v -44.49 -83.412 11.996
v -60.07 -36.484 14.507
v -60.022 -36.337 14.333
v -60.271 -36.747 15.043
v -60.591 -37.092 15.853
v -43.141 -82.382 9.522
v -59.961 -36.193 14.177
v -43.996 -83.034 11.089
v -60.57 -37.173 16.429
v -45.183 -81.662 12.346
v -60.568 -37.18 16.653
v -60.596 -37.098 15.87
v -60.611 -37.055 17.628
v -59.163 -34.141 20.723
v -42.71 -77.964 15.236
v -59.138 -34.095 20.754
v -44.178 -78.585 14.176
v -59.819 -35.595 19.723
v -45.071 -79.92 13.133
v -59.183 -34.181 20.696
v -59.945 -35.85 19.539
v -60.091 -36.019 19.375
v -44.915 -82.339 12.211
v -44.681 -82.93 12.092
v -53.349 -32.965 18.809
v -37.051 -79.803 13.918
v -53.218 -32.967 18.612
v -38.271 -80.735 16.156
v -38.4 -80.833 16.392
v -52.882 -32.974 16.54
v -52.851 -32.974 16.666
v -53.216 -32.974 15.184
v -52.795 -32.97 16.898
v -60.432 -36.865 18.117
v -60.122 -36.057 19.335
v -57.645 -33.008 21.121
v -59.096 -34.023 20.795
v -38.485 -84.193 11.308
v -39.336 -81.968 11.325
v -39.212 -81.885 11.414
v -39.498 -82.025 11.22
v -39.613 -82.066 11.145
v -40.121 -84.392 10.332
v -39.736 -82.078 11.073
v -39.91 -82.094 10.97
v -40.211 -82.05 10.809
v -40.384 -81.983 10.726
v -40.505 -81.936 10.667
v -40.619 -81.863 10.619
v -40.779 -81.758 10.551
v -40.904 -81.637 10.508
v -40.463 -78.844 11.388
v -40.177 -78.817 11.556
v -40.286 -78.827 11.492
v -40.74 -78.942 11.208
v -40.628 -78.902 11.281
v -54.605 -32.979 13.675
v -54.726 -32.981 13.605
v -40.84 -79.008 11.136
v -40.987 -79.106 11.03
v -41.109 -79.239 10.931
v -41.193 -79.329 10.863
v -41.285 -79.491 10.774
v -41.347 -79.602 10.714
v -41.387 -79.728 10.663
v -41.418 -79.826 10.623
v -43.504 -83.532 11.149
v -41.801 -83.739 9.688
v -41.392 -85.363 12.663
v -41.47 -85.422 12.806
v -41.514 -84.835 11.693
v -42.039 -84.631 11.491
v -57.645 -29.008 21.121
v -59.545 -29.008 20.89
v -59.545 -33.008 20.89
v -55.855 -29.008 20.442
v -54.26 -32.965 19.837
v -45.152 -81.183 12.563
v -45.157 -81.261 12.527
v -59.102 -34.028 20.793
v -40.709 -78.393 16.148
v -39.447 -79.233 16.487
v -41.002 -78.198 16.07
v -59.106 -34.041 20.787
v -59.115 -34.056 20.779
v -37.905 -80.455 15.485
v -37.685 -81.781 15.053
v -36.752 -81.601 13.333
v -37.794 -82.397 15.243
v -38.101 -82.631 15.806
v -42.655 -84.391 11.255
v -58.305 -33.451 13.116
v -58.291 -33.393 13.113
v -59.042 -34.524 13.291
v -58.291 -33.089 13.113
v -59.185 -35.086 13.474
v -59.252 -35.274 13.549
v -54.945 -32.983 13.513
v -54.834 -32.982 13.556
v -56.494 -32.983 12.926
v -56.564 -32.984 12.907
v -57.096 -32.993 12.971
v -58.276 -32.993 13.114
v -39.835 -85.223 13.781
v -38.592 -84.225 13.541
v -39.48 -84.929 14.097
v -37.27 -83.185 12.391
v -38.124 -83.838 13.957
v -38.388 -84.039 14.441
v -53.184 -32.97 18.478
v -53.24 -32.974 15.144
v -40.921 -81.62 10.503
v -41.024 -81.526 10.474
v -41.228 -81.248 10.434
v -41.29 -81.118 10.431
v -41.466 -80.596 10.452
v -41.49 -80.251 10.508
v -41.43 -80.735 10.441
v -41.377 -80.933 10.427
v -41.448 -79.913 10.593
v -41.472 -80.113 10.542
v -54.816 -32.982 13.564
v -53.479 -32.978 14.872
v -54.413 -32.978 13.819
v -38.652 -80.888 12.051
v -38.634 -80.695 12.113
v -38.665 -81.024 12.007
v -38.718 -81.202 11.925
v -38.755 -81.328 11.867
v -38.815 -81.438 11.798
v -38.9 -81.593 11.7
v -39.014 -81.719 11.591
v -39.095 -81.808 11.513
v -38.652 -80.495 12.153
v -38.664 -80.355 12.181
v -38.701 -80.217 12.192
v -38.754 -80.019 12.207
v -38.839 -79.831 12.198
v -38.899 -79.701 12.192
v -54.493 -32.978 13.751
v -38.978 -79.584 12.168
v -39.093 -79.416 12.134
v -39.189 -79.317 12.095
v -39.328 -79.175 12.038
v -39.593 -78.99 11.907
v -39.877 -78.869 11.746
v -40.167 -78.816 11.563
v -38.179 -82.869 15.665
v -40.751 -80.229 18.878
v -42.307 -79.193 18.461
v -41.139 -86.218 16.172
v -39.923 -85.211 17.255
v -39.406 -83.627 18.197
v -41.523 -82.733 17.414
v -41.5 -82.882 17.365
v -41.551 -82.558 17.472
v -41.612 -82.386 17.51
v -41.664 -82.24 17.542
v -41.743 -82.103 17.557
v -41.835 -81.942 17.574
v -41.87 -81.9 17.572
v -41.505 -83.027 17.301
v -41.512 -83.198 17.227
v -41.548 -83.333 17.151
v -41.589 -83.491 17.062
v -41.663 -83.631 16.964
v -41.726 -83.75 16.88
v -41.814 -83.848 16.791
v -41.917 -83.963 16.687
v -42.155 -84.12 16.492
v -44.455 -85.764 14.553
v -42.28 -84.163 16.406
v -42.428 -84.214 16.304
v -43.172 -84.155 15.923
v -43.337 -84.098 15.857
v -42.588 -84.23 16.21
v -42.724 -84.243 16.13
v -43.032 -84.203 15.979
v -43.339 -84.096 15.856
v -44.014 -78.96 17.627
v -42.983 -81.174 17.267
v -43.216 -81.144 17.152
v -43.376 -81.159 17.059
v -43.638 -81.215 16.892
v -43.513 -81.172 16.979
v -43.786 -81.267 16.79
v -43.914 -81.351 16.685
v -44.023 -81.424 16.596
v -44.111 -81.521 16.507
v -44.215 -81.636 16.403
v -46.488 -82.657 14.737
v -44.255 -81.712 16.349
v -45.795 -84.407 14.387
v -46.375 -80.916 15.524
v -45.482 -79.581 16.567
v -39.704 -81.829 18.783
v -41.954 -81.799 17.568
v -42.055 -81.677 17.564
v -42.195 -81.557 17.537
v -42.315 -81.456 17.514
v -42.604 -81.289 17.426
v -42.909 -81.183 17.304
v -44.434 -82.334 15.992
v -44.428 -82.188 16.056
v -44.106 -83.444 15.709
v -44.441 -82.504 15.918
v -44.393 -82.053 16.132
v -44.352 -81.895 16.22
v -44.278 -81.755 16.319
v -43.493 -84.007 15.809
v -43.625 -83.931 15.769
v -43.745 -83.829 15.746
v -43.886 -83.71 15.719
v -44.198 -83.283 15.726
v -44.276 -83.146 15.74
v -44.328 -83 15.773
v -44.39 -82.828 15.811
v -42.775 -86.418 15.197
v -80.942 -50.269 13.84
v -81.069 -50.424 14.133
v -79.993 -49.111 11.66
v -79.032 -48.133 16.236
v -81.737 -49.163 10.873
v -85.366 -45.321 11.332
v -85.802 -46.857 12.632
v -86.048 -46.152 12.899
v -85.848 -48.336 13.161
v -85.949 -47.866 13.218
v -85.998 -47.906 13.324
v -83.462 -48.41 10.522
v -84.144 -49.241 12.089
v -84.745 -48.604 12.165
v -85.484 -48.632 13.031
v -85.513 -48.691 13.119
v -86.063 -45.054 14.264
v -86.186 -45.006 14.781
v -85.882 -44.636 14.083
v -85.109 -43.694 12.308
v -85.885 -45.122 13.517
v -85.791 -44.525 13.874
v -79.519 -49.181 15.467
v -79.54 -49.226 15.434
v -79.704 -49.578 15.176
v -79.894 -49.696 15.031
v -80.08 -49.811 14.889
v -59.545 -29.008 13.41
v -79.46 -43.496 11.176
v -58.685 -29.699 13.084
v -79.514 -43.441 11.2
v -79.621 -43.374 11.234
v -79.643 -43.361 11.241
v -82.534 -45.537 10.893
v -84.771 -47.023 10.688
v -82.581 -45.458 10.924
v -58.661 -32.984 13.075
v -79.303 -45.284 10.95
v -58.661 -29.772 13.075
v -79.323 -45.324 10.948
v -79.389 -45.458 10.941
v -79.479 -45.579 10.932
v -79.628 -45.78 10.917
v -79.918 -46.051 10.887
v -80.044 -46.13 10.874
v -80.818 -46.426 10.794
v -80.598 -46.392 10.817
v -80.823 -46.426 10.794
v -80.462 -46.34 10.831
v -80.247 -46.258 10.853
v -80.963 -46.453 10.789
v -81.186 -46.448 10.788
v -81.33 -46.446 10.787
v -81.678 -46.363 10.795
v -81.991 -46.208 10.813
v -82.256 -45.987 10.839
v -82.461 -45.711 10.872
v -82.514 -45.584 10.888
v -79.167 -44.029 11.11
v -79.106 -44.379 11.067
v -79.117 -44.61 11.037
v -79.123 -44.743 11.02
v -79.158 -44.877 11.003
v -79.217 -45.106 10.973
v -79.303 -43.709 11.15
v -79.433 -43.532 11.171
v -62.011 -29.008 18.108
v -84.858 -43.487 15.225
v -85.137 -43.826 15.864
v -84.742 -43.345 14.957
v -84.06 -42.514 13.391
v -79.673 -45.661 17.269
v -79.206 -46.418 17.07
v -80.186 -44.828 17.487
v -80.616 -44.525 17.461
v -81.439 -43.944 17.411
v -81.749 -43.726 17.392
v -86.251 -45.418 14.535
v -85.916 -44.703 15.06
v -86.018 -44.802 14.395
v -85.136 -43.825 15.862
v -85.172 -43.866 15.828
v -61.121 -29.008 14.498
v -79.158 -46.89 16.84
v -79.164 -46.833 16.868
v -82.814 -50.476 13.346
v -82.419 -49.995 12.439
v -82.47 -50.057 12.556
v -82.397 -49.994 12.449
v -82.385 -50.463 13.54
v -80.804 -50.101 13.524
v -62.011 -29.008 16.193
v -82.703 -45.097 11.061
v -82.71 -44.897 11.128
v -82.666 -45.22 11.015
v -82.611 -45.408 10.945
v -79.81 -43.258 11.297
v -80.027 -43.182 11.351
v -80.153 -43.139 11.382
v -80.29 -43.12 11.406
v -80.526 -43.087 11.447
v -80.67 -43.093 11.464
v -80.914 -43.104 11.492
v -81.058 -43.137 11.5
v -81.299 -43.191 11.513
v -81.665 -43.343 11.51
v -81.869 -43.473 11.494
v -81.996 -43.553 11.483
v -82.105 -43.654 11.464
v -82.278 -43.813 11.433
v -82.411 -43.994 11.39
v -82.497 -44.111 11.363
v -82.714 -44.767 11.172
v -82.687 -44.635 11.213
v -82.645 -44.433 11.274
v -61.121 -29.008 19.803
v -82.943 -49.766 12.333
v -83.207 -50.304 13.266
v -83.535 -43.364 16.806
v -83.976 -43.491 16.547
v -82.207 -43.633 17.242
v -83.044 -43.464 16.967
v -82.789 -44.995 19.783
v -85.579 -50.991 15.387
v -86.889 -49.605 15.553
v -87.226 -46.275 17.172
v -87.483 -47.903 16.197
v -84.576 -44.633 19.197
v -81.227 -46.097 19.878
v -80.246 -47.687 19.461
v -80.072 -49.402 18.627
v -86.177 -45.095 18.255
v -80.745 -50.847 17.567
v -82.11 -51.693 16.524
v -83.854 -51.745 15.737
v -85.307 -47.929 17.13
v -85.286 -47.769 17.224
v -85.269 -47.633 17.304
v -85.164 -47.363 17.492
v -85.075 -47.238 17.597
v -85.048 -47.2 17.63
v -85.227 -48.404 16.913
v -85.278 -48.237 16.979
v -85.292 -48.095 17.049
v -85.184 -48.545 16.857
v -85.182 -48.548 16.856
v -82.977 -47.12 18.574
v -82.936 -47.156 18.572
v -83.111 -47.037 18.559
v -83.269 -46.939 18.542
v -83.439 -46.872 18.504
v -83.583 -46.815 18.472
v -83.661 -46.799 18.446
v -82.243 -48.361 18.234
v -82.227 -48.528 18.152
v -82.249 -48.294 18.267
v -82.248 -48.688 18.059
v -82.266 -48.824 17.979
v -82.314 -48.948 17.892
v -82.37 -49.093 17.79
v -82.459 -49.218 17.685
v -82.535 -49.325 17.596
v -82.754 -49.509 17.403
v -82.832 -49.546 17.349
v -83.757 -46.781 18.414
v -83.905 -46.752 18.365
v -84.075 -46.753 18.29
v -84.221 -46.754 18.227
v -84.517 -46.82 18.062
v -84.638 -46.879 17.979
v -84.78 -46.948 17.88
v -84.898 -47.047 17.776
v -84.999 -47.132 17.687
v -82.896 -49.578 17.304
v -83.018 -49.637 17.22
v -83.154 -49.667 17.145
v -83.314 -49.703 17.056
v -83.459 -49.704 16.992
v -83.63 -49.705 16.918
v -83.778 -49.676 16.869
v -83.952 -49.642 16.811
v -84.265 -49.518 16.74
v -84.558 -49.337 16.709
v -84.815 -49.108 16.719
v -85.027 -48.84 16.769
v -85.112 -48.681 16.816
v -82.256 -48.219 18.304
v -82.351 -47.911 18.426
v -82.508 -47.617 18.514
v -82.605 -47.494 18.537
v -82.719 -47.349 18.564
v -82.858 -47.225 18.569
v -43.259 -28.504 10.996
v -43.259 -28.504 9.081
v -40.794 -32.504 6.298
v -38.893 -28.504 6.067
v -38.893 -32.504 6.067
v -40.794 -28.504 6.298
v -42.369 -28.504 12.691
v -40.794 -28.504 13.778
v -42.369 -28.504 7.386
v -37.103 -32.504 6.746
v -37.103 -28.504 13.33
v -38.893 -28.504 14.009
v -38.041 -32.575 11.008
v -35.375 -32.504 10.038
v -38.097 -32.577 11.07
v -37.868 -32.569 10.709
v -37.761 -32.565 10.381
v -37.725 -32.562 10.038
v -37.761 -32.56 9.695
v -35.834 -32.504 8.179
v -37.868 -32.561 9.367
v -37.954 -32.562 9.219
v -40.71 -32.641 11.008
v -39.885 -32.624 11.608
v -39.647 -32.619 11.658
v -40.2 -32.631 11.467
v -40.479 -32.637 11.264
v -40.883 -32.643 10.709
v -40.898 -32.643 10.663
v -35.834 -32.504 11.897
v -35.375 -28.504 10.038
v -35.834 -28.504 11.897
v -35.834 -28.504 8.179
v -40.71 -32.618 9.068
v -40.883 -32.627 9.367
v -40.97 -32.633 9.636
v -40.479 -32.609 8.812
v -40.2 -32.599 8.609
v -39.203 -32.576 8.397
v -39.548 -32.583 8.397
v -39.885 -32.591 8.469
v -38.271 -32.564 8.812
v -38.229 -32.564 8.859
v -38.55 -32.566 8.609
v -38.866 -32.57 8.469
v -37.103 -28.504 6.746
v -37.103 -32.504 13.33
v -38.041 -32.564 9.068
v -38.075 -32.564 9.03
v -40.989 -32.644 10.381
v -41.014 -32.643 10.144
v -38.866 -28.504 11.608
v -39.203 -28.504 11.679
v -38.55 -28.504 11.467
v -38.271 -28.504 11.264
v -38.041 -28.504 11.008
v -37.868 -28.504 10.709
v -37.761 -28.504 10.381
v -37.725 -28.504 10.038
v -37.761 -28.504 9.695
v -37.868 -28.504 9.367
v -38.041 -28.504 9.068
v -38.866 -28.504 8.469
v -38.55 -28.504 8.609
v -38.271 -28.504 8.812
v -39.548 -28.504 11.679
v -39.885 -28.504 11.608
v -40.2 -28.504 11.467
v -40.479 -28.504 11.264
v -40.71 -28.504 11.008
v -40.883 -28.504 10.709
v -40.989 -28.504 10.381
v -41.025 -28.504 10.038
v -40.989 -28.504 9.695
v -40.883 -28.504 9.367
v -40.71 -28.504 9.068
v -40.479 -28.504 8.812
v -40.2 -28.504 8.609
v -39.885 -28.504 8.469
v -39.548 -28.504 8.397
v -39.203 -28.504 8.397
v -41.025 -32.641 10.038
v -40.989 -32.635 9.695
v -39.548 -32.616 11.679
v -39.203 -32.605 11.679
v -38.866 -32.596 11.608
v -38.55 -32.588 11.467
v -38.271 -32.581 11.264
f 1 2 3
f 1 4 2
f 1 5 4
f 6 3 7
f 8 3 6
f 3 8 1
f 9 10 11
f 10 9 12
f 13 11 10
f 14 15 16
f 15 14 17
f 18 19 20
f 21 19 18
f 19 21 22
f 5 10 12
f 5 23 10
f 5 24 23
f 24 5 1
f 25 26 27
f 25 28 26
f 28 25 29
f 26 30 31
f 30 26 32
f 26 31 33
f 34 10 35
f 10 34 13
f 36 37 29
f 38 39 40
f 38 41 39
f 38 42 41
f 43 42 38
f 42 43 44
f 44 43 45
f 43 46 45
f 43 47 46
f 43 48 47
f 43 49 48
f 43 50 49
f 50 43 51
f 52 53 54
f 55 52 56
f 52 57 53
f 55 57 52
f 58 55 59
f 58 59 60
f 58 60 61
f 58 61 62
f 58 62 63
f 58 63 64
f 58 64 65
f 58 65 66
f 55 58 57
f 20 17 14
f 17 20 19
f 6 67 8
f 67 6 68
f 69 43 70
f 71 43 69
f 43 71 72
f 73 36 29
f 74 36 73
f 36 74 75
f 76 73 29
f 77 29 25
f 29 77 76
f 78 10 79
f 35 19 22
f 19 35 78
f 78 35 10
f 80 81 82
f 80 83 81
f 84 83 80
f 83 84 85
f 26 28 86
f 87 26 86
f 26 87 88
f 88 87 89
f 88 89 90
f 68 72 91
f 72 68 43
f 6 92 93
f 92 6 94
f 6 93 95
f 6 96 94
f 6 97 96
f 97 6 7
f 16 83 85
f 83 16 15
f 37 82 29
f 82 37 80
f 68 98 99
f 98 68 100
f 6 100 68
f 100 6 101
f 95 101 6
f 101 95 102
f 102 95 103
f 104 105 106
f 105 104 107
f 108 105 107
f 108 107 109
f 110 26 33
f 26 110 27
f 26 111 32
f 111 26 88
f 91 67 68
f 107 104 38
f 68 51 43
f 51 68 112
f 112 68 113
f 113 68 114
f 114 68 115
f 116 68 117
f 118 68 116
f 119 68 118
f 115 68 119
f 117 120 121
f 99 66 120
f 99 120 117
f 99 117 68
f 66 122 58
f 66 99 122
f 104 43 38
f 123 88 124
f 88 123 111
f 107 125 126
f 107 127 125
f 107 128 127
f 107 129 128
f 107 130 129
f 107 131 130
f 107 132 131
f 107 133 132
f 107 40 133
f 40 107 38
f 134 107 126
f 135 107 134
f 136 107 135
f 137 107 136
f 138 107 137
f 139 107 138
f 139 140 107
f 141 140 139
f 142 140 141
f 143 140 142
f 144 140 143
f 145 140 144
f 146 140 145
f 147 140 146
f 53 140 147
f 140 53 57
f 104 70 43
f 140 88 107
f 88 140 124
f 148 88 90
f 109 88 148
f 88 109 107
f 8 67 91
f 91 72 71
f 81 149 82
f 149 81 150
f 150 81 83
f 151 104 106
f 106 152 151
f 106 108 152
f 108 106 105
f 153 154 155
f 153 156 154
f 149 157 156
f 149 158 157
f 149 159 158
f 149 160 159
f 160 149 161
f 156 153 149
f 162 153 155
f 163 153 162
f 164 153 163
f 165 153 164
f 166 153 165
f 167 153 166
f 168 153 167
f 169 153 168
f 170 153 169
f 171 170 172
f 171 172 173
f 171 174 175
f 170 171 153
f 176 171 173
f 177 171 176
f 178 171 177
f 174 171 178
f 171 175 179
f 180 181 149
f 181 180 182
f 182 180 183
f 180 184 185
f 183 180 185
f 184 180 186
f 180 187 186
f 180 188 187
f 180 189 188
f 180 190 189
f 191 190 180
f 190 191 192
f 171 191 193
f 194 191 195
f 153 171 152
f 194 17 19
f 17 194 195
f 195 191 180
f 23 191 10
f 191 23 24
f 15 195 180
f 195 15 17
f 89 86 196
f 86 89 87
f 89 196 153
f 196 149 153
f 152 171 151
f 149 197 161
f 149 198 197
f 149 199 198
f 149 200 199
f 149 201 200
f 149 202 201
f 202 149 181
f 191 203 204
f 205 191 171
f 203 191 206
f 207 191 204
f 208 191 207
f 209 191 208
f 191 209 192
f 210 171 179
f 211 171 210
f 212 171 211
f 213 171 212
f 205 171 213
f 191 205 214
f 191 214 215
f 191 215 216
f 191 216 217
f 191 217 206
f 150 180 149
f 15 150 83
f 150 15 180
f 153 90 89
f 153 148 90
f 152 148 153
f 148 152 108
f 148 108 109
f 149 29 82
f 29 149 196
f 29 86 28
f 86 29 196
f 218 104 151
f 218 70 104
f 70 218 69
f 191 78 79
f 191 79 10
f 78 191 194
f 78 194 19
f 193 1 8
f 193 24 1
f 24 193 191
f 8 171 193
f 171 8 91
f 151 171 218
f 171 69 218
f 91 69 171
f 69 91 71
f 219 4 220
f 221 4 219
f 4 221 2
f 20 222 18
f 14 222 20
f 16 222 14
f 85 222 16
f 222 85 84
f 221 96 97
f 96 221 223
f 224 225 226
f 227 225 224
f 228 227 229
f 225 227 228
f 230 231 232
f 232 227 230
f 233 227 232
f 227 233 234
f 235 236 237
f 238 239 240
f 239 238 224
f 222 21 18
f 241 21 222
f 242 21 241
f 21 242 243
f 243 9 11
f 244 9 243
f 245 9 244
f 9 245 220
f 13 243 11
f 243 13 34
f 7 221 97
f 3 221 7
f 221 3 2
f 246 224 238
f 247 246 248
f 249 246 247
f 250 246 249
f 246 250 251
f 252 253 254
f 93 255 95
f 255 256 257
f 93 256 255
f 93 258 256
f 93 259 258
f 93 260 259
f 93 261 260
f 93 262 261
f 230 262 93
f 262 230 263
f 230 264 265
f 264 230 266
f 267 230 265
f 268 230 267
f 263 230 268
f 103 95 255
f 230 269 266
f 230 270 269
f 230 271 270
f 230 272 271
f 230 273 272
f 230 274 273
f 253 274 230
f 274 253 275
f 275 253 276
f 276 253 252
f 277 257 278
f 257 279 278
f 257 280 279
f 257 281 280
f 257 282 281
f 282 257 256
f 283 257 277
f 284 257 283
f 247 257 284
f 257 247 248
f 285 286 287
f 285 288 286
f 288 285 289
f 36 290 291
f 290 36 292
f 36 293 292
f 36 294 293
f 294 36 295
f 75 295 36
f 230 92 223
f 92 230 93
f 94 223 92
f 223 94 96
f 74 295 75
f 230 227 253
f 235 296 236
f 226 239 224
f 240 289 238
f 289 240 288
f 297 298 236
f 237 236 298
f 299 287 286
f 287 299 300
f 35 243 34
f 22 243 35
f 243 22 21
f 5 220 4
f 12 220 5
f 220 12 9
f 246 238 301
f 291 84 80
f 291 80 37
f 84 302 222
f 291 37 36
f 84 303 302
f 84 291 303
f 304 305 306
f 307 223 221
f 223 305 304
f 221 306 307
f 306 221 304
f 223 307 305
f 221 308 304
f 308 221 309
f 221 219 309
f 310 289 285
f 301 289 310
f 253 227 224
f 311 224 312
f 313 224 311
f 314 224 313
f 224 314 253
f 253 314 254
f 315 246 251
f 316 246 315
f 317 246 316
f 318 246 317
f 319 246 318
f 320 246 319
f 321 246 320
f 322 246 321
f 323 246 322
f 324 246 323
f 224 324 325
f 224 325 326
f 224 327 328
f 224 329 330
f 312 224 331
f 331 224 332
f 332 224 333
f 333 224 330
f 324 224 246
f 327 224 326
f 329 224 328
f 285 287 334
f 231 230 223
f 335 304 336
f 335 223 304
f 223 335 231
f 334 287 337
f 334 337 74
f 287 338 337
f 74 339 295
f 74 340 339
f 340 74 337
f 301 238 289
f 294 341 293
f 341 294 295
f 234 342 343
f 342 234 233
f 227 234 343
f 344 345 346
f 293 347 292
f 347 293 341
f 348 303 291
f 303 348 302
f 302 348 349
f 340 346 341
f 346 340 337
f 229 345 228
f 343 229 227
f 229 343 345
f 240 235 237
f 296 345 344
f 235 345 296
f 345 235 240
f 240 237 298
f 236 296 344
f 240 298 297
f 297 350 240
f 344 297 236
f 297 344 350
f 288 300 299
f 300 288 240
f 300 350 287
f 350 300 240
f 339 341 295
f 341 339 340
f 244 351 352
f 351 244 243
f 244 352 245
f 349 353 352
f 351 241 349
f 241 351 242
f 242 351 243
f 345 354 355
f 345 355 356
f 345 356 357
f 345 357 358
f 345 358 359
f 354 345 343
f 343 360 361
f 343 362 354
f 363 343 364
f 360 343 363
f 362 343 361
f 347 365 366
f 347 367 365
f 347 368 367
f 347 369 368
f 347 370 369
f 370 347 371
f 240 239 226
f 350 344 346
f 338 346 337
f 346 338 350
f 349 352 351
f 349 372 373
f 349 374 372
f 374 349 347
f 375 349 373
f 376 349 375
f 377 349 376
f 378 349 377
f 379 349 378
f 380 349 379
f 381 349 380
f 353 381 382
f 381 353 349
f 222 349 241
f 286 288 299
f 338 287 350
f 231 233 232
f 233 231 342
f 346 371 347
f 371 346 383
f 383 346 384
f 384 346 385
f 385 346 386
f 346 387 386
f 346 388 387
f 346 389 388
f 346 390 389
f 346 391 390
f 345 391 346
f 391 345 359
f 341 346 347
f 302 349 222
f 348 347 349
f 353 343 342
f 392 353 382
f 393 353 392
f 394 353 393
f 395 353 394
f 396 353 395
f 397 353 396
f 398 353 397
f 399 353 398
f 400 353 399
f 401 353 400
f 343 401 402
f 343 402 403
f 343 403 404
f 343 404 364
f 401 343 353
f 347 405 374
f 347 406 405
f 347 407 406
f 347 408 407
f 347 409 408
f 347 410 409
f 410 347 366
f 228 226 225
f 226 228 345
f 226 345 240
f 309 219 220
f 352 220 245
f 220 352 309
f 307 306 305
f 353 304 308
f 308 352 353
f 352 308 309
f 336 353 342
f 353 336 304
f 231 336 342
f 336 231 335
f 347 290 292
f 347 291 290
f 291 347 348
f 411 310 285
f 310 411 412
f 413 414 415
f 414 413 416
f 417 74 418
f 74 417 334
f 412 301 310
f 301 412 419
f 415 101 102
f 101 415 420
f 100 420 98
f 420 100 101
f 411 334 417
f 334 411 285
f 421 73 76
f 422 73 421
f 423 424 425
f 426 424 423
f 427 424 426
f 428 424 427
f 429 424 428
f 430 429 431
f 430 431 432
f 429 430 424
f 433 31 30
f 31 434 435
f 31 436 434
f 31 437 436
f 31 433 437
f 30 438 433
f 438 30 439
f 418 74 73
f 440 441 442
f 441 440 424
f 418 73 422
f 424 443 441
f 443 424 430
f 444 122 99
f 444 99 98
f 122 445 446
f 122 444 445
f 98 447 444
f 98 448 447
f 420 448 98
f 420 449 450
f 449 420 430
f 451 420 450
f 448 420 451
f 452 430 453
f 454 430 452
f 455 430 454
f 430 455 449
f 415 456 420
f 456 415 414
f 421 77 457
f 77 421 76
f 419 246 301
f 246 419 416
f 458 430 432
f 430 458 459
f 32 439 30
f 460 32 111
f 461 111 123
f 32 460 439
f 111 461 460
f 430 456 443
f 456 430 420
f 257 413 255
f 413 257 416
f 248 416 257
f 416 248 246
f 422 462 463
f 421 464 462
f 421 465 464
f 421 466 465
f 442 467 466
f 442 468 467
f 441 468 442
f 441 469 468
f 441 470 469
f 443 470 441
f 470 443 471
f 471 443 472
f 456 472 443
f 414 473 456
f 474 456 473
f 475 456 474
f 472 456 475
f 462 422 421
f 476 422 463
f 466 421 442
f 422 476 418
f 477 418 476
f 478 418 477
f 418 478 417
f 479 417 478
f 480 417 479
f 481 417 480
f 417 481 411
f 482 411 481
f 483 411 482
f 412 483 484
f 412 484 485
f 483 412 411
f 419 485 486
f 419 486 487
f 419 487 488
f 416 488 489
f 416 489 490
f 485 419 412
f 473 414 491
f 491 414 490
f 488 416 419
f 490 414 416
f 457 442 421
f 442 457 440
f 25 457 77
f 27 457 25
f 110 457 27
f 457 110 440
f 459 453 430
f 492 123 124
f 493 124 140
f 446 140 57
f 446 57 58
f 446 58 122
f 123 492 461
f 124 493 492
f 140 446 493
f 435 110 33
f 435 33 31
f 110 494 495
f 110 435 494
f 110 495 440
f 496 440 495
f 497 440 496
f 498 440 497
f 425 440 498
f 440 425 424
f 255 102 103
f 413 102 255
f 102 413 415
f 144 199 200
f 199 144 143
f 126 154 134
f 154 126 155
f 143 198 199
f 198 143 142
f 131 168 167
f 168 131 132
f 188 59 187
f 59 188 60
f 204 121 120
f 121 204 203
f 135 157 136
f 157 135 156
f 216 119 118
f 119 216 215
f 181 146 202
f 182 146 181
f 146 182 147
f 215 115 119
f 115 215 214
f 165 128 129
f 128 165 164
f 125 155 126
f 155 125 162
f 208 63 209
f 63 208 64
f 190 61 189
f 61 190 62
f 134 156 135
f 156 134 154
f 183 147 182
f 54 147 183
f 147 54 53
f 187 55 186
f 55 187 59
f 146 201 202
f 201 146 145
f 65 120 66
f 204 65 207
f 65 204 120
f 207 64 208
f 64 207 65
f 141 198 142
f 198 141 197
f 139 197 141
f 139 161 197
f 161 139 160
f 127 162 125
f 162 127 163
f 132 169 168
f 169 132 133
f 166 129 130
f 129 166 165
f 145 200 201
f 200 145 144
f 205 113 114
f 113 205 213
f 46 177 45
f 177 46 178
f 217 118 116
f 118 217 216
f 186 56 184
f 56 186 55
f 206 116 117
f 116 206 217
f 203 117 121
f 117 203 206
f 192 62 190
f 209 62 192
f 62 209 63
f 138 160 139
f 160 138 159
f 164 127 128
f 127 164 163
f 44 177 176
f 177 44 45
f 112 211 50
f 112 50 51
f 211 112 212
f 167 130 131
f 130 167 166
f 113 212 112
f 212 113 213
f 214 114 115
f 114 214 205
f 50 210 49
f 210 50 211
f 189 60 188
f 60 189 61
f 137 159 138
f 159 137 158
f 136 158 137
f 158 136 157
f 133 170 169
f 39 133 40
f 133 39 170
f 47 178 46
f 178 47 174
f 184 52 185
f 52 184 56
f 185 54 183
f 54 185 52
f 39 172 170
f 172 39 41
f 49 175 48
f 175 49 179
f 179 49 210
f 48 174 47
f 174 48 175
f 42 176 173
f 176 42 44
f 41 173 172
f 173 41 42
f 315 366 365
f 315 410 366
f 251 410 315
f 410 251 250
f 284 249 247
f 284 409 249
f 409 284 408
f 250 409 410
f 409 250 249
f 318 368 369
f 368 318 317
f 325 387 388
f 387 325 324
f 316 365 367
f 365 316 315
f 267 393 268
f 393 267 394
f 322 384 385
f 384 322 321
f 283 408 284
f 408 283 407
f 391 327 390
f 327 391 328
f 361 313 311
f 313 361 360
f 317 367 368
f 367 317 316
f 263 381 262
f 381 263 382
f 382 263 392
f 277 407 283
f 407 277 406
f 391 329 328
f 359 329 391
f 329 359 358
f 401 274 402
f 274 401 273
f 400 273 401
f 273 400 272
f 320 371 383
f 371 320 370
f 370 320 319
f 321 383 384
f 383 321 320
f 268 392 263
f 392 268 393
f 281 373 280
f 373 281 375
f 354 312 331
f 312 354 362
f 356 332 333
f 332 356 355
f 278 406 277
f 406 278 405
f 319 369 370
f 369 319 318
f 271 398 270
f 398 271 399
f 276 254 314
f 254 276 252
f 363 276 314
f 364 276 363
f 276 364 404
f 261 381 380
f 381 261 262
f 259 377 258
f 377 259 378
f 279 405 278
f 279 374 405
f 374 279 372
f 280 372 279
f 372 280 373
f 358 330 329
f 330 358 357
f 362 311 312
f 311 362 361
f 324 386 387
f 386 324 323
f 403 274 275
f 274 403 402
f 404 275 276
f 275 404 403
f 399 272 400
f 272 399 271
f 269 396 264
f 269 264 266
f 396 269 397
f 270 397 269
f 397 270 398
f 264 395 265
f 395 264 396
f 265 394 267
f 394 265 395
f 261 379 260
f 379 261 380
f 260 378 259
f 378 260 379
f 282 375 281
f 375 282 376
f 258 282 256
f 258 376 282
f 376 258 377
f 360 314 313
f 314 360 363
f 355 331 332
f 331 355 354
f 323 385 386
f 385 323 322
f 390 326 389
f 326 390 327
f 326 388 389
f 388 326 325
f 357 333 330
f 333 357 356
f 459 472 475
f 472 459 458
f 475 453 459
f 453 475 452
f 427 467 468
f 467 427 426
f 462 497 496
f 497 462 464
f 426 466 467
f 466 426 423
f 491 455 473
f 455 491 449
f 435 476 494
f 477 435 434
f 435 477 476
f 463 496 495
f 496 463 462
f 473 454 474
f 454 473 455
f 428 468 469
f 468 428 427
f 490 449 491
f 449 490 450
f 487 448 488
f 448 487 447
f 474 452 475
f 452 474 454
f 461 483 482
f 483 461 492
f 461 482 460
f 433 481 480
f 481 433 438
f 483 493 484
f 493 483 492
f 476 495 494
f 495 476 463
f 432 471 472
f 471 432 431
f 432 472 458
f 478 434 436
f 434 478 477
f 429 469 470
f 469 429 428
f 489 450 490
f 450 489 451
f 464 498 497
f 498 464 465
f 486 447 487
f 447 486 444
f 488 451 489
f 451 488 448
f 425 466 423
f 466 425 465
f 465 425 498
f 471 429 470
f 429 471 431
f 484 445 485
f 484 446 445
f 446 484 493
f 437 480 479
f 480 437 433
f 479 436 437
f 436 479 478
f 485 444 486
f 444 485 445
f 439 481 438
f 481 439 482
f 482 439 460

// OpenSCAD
difference () {
  union () {
    hull () {
      translate ([-58.12688631393563, -31.007811226975093, 17.150286004287032]) {
        rotate (a=90.0, v=[1, 0, 0]) {
          cylinder (h=4, r=4, center=true);
        }
      }
      translate ([-29, -40, -13]) {
        translate ([-23.517243753340196, -33.10409381688861, 28.547426434629916]) {
          rotate (a=48.00000000000001, v=[0, 0, 1]) {
            rotate (a=-34.0, v=[0, 1, 0]) {
              rotate (a=-6.0, v=[1, 0, 0]) {
                translate ([0, 0, -4.5]) {
                  translate ([0, -13.575, 0]) {
                    cylinder (h=3, r=4, center=true);
                  }
                }
              }
            }
          }
        }
      }
    }
    translate ([-29, -40, -13]) {
      translate ([-23.517243753340196, -33.10409381688861, 28.547426434629916]) {
        rotate (a=48.00000000000001, v=[0, 0, 1]) {
          rotate (a=-34.0, v=[0, 1, 0]) {
            rotate (a=-6.0, v=[1, 0, 0]) {
              translate ([0, 0, -2.0999999999999996]) {
                translate ([0, -13.575, 0]) {
                  cylinder (h=4, r=4, center=true);
                }
              }
            }
          }
        }
      }
    }
    hull () {
      translate ([-58.12688631393563, -31.007811226975093, 17.150286004287032]) {
        rotate (a=90.0, v=[1, 0, 0]) {
          cylinder (h=4, r=4, center=true);
        }
      }
      translate ([-51, -25, -12]) {
        translate ([-23.517243753340196, -33.10409381688861, 28.547426434629916]) {
          rotate (a=40.0, v=[0, 0, 1]) {
            rotate (a=-34.0, v=[0, 1, 0]) {
              rotate (a=6.0, v=[1, 0, 0]) {
                translate ([0, 0, -4.5]) {
                  translate ([0, 13.575, 0]) {
                    cylinder (h=3, r=4, center=true);
                  }
                }
              }
            }
          }
        }
      }
    }
    translate ([-51, -25, -12]) {
      translate ([-23.517243753340196, -33.10409381688861, 28.547426434629916]) {
        rotate (a=40.0, v=[0, 0, 1]) {
          rotate (a=-34.0, v=[0, 1, 0]) {
            rotate (a=6.0, v=[1, 0, 0]) {
              translate ([0, 0, -2.0999999999999996]) {
                translate ([0, 13.575, 0]) {
                  cylinder (h=4, r=4, center=true);
                }
              }
            }
          }
        }
      }
    }
    hull () {
      translate ([-58.12688631393563, -31.007811226975093, 17.150286004287032]) {
        rotate (a=90.0, v=[1, 0, 0]) {
          cylinder (h=4, r=4, center=true);
        }
      }
      translate ([0, 4, 0]) {
        translate ([-39.37541674104513, -34.50390561348755, 10.038272992958468]) {
          rotate (a=90.0, v=[1, 0, 0]) {
            cylinder (h=4, r=4, center=true);
          }
        }
      }
    }
  }
  union () {
    translate ([-29, -40, -13]) {
      translate ([-23.517243753340196, -33.10409381688861, 28.547426434629916]) {
        rotate (a=48.00000000000001, v=[0, 0, 1]) {
          rotate (a=-34.0, v=[0, 1, 0]) {
            rotate (a=-6.0, v=[1, 0, 0]) {
              translate ([0, 0, -2.0999999999999996]) {
                translate ([0, -13.575, 0]) {
                  cylinder ($fn=30, h=50, r=1.65, center=true);
                }
              }
            }
          }
        }
      }
    }
    translate ([-51, -25, -12]) {
      translate ([-23.517243753340196, -33.10409381688861, 28.547426434629916]) {
        rotate (a=40.0, v=[0, 0, 1]) {
          rotate (a=-34.0, v=[0, 1, 0]) {
            rotate (a=6.0, v=[1, 0, 0]) {
              translate ([0, 0, -2.0999999999999996]) {
                translate ([0, 13.575, 0]) {
                  cylinder ($fn=30, h=50, r=1.65, center=true);
                }
              }
            }
          }
        }
      }
    }
    translate ([-39.37541674104513, -34.50390561348755, 10.038272992958468]) {
      rotate (a=90.0, v=[1, 0, 0]) {
        cylinder ($fn=30, h=50, r=1.65, center=true);
      }
    }
  }
}
